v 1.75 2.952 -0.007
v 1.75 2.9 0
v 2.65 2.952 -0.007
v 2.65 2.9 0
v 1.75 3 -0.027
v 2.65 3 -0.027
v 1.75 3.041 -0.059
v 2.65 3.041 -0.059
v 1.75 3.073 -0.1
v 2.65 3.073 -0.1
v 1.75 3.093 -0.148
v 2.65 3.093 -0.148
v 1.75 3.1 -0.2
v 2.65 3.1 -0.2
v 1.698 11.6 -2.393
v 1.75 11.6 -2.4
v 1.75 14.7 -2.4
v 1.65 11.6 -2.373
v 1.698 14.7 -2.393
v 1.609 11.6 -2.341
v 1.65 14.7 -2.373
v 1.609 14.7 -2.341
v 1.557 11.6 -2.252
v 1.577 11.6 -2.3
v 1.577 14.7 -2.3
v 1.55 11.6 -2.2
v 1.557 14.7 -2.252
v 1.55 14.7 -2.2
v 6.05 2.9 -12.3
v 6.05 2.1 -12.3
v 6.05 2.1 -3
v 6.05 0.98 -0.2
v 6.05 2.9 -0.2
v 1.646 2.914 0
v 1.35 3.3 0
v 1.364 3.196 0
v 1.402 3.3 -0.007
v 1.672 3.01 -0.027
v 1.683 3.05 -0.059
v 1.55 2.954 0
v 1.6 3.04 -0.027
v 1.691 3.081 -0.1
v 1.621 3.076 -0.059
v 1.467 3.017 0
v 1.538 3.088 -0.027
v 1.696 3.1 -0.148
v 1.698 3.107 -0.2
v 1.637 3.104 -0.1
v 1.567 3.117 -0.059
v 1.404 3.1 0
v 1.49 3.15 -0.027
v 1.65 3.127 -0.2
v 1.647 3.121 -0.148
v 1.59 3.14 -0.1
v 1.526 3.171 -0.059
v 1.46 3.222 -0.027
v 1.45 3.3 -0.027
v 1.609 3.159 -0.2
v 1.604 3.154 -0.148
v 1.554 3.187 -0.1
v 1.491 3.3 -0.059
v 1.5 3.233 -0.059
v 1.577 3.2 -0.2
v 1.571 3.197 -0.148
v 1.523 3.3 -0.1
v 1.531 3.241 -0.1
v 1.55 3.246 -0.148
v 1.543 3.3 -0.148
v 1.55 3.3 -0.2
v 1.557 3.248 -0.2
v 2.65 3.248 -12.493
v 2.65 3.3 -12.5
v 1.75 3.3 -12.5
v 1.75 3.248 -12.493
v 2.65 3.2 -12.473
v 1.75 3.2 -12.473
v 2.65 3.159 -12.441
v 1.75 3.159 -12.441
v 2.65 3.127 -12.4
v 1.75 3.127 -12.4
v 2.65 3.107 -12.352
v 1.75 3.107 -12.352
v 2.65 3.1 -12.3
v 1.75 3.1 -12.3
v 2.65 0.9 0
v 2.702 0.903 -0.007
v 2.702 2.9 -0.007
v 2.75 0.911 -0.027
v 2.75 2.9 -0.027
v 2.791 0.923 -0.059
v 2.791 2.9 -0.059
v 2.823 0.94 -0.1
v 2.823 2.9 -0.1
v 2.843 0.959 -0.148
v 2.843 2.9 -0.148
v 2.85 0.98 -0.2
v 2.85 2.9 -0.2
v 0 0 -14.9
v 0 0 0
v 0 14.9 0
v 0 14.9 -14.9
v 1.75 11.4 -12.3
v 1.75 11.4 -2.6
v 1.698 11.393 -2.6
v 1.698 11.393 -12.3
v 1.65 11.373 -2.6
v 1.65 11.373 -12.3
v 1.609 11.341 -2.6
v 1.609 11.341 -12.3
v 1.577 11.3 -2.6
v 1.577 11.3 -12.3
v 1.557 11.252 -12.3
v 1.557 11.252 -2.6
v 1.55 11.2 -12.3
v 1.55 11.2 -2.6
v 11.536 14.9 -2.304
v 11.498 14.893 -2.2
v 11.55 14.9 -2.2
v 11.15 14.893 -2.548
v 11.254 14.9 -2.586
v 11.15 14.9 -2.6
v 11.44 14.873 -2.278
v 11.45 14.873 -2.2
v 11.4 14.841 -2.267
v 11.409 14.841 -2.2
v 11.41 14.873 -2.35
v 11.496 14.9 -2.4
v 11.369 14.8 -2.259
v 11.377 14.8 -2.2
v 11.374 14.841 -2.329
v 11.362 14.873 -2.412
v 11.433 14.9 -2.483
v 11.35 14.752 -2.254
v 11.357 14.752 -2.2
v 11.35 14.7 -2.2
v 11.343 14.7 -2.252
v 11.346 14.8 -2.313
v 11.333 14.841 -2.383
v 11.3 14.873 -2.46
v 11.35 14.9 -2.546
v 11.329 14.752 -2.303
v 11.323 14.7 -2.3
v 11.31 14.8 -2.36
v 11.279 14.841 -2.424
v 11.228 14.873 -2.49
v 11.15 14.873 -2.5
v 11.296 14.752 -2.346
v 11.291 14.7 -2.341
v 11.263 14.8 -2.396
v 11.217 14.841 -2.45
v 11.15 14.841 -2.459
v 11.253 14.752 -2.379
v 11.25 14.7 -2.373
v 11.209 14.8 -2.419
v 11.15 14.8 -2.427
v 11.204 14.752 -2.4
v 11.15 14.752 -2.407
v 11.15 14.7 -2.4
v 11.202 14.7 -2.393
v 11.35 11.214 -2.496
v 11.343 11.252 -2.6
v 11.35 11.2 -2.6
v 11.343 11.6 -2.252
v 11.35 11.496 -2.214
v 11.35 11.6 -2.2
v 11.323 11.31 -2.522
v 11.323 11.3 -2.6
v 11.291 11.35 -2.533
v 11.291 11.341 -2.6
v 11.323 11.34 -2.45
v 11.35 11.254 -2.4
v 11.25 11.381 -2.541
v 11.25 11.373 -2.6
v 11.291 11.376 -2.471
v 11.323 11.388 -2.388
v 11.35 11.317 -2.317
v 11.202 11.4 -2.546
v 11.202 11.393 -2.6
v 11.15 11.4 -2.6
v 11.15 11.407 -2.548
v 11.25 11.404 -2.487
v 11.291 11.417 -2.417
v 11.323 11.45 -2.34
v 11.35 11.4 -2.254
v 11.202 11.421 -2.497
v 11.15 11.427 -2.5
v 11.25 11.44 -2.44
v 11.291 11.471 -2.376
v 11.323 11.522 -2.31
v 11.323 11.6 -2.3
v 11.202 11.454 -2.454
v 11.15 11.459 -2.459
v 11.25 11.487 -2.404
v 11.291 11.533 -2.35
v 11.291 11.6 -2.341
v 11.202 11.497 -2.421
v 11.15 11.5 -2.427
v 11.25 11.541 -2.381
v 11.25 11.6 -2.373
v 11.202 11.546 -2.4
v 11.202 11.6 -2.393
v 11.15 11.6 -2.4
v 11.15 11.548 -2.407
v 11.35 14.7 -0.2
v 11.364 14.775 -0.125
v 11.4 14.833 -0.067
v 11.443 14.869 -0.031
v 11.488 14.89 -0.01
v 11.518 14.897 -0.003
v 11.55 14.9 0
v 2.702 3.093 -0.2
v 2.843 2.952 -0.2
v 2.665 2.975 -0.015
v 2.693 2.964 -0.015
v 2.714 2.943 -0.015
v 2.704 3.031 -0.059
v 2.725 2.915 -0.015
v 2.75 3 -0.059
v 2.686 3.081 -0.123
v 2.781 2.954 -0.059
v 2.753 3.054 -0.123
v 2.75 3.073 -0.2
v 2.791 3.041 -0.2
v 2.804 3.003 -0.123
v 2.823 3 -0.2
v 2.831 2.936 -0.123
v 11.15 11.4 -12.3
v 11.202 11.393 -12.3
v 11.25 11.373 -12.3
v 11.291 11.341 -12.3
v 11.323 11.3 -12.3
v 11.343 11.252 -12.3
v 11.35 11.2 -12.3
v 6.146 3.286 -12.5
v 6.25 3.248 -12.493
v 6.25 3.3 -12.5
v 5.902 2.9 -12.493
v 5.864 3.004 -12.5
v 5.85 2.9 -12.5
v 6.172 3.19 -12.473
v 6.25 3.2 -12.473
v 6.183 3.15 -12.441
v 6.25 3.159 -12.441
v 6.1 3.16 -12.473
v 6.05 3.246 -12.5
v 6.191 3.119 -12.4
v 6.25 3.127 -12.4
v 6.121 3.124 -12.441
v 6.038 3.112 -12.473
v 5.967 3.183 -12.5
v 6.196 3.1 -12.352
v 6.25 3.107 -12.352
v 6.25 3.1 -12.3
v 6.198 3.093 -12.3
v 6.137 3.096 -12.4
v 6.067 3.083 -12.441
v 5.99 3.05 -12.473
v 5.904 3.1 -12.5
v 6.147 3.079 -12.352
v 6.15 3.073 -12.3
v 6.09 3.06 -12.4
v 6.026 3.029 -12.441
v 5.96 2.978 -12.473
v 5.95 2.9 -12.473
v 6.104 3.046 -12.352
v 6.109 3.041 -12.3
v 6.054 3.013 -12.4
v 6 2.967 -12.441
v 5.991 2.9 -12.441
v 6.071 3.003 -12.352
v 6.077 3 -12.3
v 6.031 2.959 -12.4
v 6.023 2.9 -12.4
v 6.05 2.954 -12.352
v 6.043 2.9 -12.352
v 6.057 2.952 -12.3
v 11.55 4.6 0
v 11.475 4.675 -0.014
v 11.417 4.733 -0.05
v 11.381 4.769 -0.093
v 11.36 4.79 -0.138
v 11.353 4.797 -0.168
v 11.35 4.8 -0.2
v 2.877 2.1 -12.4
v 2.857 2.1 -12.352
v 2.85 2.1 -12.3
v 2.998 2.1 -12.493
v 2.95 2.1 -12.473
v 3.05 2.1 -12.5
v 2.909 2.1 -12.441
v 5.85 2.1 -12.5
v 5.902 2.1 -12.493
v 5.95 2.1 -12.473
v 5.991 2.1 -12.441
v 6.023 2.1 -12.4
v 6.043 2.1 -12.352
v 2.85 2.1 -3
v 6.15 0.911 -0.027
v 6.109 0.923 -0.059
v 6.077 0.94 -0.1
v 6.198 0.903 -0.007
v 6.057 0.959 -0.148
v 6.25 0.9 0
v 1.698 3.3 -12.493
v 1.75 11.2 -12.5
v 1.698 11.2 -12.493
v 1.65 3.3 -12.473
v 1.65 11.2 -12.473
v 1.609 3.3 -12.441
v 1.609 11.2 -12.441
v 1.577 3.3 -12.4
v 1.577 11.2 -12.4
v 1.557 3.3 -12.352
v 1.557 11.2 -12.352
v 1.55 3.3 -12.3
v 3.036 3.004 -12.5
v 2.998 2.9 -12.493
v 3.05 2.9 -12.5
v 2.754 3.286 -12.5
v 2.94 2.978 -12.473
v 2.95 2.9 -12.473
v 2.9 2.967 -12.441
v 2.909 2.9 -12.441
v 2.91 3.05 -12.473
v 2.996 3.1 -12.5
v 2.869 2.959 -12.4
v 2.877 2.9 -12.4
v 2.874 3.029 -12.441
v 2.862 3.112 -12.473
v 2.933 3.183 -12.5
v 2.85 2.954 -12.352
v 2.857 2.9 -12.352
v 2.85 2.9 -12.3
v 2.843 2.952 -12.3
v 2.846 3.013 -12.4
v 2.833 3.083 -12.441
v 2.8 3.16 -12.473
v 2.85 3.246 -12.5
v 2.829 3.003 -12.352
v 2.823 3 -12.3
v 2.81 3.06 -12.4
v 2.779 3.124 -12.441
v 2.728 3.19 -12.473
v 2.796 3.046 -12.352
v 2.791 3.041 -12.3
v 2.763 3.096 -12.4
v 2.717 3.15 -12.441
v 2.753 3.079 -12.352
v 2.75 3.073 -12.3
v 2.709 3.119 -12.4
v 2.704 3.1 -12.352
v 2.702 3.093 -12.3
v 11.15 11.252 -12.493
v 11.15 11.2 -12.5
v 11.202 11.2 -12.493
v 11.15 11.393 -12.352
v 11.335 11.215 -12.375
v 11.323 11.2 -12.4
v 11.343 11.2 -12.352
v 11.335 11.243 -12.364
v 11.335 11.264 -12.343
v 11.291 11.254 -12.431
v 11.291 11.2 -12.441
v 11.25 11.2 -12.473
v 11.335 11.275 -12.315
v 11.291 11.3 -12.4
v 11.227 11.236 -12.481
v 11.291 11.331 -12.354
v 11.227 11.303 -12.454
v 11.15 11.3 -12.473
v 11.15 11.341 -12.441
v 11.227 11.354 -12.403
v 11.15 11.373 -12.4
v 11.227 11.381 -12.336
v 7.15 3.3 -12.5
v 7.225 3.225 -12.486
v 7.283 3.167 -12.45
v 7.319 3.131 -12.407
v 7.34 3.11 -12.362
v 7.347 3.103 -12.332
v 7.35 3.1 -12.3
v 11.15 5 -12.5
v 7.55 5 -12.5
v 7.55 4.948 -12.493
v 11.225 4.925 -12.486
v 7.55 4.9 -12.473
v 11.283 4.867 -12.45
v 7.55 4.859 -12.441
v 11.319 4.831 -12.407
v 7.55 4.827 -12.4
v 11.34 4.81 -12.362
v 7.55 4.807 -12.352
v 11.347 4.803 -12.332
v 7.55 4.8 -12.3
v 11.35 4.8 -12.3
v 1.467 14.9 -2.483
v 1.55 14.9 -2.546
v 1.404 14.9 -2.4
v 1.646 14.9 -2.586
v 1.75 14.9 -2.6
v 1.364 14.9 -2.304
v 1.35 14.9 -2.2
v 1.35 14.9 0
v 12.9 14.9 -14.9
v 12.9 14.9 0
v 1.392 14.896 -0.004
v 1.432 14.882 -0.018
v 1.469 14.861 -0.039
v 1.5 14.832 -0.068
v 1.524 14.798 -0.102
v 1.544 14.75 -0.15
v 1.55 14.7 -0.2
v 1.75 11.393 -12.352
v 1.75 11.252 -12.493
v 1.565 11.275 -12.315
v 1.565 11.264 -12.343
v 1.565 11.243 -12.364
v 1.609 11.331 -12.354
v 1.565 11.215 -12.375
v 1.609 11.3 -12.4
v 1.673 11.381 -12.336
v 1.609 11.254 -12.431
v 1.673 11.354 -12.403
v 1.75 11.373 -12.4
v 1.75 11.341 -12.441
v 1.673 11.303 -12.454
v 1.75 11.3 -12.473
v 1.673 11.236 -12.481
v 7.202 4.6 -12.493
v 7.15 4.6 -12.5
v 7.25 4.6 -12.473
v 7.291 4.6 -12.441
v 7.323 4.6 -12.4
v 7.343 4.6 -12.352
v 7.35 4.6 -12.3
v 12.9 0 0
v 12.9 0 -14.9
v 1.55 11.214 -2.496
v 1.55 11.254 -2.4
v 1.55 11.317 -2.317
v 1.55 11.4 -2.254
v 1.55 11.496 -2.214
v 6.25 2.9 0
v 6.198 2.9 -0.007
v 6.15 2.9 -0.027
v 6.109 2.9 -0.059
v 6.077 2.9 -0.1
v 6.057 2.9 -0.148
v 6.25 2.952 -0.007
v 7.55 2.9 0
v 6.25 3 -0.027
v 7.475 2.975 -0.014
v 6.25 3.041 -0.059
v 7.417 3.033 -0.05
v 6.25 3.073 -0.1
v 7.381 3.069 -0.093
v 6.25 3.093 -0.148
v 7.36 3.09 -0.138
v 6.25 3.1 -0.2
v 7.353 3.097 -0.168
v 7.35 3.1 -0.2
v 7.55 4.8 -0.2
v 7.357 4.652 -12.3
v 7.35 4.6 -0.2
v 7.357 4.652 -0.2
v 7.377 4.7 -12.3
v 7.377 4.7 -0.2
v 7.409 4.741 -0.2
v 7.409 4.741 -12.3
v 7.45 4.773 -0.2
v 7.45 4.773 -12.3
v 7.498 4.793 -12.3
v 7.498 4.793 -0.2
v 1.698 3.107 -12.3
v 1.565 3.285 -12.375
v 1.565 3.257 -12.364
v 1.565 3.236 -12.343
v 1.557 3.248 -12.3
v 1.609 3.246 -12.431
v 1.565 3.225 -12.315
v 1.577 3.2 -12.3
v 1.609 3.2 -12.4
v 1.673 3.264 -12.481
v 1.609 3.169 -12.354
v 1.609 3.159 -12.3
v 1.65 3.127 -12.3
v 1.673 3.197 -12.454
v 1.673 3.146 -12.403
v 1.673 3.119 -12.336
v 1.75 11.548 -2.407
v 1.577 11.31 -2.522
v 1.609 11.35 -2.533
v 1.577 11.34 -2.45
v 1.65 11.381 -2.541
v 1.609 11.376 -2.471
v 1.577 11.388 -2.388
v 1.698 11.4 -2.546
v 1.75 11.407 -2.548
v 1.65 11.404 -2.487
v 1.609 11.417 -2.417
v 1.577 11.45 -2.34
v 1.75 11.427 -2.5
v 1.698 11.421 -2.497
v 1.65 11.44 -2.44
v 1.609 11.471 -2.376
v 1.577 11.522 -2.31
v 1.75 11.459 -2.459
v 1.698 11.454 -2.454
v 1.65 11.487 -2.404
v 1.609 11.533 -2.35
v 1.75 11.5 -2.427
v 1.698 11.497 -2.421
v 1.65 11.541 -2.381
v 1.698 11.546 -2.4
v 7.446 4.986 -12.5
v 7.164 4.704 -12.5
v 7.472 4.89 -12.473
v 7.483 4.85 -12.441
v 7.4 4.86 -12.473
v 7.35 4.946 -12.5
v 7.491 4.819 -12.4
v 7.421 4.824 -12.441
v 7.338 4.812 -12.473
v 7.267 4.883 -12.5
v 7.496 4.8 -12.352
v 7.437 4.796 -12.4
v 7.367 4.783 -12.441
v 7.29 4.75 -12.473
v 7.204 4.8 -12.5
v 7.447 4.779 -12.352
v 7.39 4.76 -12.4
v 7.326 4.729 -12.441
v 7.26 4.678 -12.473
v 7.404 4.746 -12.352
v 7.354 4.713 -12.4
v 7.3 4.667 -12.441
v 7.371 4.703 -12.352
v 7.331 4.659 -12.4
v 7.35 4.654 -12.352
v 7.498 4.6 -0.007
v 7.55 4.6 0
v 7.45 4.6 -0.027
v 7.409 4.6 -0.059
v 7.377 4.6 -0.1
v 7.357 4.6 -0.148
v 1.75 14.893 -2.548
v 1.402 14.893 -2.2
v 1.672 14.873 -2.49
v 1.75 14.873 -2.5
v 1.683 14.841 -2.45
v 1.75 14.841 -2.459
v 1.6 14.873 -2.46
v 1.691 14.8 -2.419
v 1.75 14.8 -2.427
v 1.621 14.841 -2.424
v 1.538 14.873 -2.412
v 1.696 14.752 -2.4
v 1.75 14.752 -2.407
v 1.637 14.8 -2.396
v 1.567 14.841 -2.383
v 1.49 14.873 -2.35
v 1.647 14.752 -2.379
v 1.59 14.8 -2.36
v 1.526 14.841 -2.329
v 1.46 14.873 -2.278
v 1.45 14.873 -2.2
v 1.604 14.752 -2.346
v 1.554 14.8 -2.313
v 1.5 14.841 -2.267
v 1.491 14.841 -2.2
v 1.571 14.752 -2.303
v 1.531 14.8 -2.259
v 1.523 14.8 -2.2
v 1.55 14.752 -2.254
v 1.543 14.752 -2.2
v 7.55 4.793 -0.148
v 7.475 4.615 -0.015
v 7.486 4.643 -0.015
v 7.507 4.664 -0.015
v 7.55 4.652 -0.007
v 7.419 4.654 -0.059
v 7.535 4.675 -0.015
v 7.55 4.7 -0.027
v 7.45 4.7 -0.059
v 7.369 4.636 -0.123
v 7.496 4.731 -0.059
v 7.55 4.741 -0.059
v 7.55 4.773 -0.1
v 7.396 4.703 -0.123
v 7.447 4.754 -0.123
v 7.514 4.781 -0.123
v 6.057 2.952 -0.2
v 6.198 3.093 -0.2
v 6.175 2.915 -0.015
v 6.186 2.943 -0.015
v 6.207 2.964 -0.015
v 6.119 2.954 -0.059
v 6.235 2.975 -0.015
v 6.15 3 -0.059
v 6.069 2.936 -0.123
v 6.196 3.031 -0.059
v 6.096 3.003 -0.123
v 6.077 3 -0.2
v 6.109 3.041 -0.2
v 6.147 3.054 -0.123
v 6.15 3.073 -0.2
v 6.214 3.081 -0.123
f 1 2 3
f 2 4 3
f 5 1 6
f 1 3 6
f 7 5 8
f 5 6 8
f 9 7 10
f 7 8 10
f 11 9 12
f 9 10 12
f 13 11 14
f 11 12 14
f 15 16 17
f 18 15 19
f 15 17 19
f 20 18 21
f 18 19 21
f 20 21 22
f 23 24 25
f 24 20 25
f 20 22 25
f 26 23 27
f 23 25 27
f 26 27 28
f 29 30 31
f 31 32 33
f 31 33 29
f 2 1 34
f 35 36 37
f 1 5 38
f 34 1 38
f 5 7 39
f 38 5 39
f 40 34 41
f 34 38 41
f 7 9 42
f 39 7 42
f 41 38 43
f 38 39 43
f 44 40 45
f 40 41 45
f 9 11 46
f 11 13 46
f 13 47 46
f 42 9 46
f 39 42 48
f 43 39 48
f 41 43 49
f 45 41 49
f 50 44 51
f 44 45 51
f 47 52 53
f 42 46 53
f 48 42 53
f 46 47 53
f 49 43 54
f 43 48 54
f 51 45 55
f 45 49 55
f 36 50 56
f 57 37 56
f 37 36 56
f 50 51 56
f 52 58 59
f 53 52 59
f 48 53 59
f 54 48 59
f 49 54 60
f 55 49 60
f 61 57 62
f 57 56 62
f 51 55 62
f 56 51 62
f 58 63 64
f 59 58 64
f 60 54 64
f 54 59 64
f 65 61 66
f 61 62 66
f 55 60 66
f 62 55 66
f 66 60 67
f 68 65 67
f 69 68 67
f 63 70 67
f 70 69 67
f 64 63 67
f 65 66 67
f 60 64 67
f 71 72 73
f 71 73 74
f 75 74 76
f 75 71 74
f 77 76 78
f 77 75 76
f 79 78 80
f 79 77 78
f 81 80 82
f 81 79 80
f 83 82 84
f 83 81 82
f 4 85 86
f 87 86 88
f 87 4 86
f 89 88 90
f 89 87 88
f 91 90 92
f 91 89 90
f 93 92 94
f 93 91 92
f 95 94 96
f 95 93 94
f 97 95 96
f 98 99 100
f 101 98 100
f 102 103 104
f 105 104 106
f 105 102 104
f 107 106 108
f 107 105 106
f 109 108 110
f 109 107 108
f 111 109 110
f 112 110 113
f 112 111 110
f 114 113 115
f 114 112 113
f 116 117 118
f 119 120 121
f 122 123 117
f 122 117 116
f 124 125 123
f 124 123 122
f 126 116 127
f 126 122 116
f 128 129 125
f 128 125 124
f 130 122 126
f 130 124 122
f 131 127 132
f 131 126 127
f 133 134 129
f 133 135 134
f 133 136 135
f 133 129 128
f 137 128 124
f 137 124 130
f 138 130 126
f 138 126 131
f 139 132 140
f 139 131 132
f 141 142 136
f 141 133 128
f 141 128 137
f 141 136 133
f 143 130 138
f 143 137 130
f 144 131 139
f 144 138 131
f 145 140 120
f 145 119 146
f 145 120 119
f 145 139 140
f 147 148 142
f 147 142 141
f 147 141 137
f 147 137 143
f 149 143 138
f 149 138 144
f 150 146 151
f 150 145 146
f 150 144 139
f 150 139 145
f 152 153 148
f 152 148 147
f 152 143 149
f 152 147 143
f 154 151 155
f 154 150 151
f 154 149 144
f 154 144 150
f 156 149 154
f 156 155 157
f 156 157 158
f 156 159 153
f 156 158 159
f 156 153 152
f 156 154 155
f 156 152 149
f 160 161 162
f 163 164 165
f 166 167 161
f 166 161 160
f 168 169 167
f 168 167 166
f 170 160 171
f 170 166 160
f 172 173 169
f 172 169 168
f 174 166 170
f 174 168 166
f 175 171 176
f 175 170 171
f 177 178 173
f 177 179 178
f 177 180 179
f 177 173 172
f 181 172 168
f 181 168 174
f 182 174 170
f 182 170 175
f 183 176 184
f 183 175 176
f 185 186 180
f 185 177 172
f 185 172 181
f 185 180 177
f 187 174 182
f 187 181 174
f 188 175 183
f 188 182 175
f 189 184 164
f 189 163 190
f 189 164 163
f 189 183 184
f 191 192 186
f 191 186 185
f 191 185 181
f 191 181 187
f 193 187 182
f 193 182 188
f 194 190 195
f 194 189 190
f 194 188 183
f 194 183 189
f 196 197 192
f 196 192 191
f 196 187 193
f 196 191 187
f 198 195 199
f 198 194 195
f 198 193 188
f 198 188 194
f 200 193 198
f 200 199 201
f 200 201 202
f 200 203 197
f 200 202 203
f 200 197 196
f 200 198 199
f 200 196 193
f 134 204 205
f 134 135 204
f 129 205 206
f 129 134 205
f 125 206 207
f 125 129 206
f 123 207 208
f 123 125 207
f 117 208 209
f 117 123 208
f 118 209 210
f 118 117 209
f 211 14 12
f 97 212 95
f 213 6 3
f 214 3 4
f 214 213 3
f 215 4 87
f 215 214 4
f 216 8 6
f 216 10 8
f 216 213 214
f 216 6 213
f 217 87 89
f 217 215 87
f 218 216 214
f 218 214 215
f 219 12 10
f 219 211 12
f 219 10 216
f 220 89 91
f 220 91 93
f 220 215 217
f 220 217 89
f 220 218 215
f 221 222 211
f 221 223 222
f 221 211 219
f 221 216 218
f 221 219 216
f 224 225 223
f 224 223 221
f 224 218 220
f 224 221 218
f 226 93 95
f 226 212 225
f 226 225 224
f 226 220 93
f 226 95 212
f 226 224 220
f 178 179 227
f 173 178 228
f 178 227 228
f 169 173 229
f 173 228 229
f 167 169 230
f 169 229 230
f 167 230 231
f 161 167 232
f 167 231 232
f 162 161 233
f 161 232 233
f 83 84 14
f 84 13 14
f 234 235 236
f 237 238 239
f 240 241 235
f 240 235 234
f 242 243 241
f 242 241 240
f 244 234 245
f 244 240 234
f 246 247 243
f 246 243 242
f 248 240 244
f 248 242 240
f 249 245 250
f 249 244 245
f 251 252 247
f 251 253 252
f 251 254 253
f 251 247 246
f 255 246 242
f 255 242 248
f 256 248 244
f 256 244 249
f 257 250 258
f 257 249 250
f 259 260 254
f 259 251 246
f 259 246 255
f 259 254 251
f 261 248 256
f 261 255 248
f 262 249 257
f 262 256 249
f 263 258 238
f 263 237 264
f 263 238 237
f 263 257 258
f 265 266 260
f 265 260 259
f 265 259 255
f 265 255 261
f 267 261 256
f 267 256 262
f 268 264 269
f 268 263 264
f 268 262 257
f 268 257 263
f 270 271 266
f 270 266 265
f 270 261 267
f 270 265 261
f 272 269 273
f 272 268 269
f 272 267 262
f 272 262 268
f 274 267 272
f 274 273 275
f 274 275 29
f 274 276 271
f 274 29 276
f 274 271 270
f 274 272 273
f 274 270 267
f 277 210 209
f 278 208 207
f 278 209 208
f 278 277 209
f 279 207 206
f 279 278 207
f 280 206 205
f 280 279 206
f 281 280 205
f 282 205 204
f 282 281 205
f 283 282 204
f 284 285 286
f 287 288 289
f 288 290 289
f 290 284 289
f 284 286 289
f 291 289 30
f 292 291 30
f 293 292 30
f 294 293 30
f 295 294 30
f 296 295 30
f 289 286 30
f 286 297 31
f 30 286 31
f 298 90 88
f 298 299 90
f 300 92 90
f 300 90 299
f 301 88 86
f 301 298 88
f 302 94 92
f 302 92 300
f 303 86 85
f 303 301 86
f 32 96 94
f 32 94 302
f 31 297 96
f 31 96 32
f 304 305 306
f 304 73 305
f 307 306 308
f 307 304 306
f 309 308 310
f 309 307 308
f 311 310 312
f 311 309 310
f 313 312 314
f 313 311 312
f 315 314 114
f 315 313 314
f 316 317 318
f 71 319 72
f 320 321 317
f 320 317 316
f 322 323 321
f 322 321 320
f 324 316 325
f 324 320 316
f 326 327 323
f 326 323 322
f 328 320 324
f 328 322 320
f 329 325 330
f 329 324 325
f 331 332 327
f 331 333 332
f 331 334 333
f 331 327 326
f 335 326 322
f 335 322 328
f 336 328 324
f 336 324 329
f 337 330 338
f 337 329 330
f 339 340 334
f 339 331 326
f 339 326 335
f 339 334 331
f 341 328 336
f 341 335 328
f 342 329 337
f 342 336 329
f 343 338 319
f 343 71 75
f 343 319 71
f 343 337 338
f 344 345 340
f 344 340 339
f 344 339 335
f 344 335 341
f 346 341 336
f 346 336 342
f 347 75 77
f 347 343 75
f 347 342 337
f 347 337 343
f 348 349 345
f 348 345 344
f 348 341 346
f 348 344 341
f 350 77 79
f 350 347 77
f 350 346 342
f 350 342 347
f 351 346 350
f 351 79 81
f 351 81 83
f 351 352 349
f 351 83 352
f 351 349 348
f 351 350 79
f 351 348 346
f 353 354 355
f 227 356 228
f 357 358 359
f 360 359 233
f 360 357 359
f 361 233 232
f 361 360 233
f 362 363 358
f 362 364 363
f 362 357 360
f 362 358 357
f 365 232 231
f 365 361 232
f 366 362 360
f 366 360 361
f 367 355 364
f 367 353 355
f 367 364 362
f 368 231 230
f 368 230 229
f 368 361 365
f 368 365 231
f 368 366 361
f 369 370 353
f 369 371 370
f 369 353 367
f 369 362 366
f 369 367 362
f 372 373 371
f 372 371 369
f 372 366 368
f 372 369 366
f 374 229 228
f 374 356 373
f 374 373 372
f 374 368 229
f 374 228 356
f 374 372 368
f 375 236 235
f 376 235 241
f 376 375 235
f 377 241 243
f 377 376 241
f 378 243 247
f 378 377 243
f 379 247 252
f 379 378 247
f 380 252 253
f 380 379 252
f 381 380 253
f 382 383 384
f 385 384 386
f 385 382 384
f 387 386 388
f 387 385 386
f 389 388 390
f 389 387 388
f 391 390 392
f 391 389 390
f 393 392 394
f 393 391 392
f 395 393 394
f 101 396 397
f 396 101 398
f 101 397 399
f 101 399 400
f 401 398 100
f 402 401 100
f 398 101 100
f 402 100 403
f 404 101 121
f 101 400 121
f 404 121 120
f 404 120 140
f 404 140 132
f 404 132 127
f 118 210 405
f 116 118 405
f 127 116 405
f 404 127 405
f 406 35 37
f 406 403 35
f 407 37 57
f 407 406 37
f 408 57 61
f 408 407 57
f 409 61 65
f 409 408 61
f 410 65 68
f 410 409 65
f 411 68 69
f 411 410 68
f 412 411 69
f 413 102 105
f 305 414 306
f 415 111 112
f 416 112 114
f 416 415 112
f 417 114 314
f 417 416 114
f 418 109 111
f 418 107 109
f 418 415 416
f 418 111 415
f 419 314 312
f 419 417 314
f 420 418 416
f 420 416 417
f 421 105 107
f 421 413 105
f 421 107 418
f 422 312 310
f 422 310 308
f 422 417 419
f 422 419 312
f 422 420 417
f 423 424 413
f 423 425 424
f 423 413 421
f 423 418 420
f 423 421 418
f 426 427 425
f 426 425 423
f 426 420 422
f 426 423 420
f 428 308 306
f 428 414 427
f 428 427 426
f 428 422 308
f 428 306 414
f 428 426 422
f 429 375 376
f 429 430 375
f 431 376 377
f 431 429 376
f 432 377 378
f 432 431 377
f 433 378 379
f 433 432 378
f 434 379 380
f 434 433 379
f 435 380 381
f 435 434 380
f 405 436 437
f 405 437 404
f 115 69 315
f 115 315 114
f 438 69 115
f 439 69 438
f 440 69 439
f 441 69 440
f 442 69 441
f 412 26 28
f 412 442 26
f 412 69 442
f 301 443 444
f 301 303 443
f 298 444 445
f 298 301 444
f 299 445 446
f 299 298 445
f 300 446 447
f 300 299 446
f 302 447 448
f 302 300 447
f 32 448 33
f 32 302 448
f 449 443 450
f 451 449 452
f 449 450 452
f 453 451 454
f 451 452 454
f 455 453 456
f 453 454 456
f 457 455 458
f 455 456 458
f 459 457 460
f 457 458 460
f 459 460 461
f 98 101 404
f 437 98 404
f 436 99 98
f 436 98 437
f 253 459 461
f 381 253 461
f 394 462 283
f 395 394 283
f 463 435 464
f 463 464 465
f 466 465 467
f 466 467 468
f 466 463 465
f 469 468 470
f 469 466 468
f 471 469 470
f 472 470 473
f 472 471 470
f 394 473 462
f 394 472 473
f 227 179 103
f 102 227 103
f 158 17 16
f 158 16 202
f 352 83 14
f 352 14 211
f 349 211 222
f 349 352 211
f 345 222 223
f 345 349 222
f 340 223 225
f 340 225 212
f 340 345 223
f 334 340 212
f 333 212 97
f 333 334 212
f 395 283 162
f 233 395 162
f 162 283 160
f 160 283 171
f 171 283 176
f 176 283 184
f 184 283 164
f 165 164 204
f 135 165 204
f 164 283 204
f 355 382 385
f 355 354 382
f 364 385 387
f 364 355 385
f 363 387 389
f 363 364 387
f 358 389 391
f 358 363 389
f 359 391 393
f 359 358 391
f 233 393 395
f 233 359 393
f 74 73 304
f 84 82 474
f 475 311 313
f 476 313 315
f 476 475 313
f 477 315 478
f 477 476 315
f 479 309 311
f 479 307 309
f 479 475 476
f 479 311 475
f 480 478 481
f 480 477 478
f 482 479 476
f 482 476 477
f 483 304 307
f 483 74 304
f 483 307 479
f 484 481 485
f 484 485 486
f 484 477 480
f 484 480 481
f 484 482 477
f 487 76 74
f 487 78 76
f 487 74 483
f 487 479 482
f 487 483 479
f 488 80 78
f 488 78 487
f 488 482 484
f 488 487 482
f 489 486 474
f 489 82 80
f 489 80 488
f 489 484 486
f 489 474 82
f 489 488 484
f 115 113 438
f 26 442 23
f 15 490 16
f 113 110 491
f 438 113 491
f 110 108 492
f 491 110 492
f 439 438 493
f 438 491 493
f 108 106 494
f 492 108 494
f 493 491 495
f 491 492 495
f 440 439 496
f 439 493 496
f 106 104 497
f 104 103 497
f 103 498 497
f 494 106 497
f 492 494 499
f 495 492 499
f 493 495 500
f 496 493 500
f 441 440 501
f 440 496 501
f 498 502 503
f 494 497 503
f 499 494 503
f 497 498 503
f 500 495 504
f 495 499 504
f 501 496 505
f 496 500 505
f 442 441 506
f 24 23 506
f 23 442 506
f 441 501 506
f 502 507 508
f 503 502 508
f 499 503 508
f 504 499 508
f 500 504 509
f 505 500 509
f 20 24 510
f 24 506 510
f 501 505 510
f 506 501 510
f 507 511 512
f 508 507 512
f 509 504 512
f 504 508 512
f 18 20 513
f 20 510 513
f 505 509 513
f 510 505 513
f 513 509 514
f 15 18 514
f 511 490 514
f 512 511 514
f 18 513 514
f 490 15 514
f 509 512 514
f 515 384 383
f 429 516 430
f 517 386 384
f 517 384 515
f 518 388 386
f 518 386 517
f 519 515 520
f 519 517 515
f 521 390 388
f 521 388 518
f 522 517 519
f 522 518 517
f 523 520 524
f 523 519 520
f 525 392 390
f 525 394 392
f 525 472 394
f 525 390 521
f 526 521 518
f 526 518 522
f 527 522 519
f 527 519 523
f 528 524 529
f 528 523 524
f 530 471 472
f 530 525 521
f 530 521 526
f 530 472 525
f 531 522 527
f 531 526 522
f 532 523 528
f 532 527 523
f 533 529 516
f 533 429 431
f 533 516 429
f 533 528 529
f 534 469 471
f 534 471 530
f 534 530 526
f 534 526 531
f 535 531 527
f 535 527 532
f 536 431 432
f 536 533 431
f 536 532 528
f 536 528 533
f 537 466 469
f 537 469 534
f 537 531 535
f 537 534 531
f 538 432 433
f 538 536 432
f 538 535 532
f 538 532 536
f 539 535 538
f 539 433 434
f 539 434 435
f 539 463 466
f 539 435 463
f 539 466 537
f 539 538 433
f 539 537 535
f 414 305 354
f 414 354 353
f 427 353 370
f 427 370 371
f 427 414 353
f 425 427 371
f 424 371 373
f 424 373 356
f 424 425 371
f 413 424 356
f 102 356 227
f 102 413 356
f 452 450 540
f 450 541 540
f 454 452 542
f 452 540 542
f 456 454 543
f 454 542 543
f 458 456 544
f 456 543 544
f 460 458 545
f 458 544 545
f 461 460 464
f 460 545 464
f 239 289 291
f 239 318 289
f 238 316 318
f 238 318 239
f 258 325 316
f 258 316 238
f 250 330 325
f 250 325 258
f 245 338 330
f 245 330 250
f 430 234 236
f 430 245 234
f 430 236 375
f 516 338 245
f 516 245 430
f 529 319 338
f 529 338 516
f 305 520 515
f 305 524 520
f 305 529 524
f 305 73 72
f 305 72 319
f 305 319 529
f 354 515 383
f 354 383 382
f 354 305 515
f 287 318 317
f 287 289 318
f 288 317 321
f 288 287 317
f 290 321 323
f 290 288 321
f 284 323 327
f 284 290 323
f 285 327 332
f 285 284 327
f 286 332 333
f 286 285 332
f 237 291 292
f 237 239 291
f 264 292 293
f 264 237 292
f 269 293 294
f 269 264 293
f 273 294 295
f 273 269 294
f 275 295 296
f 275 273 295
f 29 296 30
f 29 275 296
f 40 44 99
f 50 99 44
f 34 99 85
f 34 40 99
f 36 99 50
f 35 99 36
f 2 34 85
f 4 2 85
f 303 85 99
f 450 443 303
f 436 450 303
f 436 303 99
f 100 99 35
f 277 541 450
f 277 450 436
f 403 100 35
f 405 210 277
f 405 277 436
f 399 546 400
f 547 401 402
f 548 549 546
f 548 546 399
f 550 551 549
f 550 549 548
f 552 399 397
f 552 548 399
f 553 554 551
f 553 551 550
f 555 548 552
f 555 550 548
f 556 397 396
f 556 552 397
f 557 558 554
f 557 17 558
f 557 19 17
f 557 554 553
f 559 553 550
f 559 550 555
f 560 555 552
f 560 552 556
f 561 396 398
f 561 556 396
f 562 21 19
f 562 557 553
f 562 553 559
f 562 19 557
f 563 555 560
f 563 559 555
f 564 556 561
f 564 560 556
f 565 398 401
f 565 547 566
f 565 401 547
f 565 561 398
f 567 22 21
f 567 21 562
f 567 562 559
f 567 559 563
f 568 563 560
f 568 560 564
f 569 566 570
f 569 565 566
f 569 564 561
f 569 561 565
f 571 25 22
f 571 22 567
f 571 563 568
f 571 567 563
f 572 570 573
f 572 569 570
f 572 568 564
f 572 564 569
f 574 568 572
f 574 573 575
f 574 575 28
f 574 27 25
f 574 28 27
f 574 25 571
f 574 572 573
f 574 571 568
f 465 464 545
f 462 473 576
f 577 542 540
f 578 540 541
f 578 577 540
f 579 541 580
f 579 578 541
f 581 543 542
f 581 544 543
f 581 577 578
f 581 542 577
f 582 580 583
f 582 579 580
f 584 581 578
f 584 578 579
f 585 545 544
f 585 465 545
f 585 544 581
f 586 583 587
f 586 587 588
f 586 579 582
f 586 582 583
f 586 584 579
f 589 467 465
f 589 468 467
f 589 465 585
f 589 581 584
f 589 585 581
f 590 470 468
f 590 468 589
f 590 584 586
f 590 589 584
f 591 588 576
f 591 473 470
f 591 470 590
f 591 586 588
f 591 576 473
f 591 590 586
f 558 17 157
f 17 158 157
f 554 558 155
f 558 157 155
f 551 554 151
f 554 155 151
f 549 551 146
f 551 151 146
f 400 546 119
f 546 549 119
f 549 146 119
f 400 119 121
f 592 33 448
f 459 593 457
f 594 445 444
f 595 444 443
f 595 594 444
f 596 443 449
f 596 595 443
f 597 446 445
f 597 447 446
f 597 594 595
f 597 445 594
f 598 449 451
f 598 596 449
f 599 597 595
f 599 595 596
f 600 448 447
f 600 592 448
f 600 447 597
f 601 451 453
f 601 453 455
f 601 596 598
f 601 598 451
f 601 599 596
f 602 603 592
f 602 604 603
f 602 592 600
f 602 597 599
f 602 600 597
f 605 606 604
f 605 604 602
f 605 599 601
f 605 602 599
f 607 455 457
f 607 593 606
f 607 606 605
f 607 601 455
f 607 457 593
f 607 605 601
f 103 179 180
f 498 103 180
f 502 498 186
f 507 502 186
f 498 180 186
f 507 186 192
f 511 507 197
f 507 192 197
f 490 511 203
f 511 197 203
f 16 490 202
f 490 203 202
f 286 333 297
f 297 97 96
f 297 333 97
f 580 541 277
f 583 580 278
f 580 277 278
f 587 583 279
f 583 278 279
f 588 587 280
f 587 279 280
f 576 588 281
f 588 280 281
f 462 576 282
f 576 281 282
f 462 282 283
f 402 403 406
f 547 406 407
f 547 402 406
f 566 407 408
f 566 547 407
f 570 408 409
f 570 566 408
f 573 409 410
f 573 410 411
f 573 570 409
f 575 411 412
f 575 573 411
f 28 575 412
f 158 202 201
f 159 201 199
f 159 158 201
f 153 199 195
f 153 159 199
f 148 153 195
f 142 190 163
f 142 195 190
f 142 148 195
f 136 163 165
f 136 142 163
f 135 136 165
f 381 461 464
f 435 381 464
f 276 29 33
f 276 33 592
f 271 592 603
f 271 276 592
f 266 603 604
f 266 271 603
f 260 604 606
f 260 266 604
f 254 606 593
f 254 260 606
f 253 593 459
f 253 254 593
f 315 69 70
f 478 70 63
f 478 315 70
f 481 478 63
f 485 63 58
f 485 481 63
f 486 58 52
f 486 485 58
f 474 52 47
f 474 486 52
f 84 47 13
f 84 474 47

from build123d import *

# Parameters (mm, degrees)
SKETCH1_W      = 12.9
SKETCH1_H      = 14.9
EXTRUDE1_DEPTH = 14.9
SKETCH2_W      = 9.8
SKETCH2_H      = 3.5
EXTRUDE2_DEPTH = 2.4
EXTRUDE3_DEPTH = 12.5
CHAMFER1_SIZE  = 1.2
CHAMFER1_SIZE2 = 3
FILLET1_R      = 0.2


with BuildPart() as part:
    # Sketch1 → Extrude1 (new body)
    with BuildSketch(Plane.XY):
        with Locations((6.45, 7.45)):
            Rectangle(SKETCH1_W, SKETCH1_H)
    extrude(amount=-EXTRUDE1_DEPTH)

    # Sketch2 → Extrude2 (cut)
    with BuildSketch(Plane.XY):
        with Locations((6.45, 13.15)):
            Rectangle(SKETCH2_W, SKETCH2_H)
    extrude(amount=-EXTRUDE2_DEPTH, mode=Mode.SUBTRACT)

    # Sketch3 → Extrude3 (cut)
    with BuildSketch(Plane.XY):
        Polygon((1.55, 11.4), (1.55, 3.1), (2.85, 3.1), (2.85, 2.1), (6.05, 2.1), (6.05, 3.1), (7.35, 3.1), (7.35, 4.8), (11.35, 4.8), (11.35, 11.4), align=None)
    extrude(amount=-EXTRUDE3_DEPTH, mode=Mode.SUBTRACT)

    # Chamfer1
    chamfer1_edges = [part.edges().sort_by_distance(p)[0] for p in [
        (4.45, 2.1, 0),
    ]]
    chamfer1_side = [part.faces().sort_by_distance(p)[0] for p in [
        (0.775, 14.702916261, 0),
    ]]
    chamfer(chamfer1_edges, length=CHAMFER1_SIZE, length2=CHAMFER1_SIZE2, reference=chamfer1_side[0])

    # Fillet1
    fillet1_edges = [part.edges().sort_by_distance(p)[0] for p in [
        (1.55, 13.15, -2.4),
        (6.45, 14.9, -2.4),
        (1.55, 14.9, -1.2),
        (11.35, 13.15, -2.4),
        (11.35, 14.9, -1.2),
        (6.45, 11.4, -2.4),
        (1.55, 9, 0),
        (11.35, 9.85, 0),
        (6.45, 11.4, -12.5),
        (1.55, 11.4, -7.45),
        (11.35, 8.1, -12.5),
        (11.35, 11.4, -7.45),
        (9.35, 4.8, -12.5),
        (7.35, 3.95, -12.5),
        (7.35, 4.8, -6.25),
        (6.7, 3.1, -12.5),
        (6.05, 2.6, -12.5),
        (6.05, 3.1, -6.25),
        (2.85, 2.6, -12.5),
        (2.2, 3.1, -12.5),
        (2.85, 3.1, -6.25),
        (1.55, 7.25, -12.5),
        (1.55, 3.1, -6.25),
        (2.2, 3.1, 0),
        (2.85, 1.5, 0),
        (6.05, 1.5, 0),
        (6.7, 3.1, 0),
        (7.35, 3.95, 0),
        (9.35, 4.8, 0),
    ]]
    fillet(fillet1_edges, radius=FILLET1_R)


solid = part.part
